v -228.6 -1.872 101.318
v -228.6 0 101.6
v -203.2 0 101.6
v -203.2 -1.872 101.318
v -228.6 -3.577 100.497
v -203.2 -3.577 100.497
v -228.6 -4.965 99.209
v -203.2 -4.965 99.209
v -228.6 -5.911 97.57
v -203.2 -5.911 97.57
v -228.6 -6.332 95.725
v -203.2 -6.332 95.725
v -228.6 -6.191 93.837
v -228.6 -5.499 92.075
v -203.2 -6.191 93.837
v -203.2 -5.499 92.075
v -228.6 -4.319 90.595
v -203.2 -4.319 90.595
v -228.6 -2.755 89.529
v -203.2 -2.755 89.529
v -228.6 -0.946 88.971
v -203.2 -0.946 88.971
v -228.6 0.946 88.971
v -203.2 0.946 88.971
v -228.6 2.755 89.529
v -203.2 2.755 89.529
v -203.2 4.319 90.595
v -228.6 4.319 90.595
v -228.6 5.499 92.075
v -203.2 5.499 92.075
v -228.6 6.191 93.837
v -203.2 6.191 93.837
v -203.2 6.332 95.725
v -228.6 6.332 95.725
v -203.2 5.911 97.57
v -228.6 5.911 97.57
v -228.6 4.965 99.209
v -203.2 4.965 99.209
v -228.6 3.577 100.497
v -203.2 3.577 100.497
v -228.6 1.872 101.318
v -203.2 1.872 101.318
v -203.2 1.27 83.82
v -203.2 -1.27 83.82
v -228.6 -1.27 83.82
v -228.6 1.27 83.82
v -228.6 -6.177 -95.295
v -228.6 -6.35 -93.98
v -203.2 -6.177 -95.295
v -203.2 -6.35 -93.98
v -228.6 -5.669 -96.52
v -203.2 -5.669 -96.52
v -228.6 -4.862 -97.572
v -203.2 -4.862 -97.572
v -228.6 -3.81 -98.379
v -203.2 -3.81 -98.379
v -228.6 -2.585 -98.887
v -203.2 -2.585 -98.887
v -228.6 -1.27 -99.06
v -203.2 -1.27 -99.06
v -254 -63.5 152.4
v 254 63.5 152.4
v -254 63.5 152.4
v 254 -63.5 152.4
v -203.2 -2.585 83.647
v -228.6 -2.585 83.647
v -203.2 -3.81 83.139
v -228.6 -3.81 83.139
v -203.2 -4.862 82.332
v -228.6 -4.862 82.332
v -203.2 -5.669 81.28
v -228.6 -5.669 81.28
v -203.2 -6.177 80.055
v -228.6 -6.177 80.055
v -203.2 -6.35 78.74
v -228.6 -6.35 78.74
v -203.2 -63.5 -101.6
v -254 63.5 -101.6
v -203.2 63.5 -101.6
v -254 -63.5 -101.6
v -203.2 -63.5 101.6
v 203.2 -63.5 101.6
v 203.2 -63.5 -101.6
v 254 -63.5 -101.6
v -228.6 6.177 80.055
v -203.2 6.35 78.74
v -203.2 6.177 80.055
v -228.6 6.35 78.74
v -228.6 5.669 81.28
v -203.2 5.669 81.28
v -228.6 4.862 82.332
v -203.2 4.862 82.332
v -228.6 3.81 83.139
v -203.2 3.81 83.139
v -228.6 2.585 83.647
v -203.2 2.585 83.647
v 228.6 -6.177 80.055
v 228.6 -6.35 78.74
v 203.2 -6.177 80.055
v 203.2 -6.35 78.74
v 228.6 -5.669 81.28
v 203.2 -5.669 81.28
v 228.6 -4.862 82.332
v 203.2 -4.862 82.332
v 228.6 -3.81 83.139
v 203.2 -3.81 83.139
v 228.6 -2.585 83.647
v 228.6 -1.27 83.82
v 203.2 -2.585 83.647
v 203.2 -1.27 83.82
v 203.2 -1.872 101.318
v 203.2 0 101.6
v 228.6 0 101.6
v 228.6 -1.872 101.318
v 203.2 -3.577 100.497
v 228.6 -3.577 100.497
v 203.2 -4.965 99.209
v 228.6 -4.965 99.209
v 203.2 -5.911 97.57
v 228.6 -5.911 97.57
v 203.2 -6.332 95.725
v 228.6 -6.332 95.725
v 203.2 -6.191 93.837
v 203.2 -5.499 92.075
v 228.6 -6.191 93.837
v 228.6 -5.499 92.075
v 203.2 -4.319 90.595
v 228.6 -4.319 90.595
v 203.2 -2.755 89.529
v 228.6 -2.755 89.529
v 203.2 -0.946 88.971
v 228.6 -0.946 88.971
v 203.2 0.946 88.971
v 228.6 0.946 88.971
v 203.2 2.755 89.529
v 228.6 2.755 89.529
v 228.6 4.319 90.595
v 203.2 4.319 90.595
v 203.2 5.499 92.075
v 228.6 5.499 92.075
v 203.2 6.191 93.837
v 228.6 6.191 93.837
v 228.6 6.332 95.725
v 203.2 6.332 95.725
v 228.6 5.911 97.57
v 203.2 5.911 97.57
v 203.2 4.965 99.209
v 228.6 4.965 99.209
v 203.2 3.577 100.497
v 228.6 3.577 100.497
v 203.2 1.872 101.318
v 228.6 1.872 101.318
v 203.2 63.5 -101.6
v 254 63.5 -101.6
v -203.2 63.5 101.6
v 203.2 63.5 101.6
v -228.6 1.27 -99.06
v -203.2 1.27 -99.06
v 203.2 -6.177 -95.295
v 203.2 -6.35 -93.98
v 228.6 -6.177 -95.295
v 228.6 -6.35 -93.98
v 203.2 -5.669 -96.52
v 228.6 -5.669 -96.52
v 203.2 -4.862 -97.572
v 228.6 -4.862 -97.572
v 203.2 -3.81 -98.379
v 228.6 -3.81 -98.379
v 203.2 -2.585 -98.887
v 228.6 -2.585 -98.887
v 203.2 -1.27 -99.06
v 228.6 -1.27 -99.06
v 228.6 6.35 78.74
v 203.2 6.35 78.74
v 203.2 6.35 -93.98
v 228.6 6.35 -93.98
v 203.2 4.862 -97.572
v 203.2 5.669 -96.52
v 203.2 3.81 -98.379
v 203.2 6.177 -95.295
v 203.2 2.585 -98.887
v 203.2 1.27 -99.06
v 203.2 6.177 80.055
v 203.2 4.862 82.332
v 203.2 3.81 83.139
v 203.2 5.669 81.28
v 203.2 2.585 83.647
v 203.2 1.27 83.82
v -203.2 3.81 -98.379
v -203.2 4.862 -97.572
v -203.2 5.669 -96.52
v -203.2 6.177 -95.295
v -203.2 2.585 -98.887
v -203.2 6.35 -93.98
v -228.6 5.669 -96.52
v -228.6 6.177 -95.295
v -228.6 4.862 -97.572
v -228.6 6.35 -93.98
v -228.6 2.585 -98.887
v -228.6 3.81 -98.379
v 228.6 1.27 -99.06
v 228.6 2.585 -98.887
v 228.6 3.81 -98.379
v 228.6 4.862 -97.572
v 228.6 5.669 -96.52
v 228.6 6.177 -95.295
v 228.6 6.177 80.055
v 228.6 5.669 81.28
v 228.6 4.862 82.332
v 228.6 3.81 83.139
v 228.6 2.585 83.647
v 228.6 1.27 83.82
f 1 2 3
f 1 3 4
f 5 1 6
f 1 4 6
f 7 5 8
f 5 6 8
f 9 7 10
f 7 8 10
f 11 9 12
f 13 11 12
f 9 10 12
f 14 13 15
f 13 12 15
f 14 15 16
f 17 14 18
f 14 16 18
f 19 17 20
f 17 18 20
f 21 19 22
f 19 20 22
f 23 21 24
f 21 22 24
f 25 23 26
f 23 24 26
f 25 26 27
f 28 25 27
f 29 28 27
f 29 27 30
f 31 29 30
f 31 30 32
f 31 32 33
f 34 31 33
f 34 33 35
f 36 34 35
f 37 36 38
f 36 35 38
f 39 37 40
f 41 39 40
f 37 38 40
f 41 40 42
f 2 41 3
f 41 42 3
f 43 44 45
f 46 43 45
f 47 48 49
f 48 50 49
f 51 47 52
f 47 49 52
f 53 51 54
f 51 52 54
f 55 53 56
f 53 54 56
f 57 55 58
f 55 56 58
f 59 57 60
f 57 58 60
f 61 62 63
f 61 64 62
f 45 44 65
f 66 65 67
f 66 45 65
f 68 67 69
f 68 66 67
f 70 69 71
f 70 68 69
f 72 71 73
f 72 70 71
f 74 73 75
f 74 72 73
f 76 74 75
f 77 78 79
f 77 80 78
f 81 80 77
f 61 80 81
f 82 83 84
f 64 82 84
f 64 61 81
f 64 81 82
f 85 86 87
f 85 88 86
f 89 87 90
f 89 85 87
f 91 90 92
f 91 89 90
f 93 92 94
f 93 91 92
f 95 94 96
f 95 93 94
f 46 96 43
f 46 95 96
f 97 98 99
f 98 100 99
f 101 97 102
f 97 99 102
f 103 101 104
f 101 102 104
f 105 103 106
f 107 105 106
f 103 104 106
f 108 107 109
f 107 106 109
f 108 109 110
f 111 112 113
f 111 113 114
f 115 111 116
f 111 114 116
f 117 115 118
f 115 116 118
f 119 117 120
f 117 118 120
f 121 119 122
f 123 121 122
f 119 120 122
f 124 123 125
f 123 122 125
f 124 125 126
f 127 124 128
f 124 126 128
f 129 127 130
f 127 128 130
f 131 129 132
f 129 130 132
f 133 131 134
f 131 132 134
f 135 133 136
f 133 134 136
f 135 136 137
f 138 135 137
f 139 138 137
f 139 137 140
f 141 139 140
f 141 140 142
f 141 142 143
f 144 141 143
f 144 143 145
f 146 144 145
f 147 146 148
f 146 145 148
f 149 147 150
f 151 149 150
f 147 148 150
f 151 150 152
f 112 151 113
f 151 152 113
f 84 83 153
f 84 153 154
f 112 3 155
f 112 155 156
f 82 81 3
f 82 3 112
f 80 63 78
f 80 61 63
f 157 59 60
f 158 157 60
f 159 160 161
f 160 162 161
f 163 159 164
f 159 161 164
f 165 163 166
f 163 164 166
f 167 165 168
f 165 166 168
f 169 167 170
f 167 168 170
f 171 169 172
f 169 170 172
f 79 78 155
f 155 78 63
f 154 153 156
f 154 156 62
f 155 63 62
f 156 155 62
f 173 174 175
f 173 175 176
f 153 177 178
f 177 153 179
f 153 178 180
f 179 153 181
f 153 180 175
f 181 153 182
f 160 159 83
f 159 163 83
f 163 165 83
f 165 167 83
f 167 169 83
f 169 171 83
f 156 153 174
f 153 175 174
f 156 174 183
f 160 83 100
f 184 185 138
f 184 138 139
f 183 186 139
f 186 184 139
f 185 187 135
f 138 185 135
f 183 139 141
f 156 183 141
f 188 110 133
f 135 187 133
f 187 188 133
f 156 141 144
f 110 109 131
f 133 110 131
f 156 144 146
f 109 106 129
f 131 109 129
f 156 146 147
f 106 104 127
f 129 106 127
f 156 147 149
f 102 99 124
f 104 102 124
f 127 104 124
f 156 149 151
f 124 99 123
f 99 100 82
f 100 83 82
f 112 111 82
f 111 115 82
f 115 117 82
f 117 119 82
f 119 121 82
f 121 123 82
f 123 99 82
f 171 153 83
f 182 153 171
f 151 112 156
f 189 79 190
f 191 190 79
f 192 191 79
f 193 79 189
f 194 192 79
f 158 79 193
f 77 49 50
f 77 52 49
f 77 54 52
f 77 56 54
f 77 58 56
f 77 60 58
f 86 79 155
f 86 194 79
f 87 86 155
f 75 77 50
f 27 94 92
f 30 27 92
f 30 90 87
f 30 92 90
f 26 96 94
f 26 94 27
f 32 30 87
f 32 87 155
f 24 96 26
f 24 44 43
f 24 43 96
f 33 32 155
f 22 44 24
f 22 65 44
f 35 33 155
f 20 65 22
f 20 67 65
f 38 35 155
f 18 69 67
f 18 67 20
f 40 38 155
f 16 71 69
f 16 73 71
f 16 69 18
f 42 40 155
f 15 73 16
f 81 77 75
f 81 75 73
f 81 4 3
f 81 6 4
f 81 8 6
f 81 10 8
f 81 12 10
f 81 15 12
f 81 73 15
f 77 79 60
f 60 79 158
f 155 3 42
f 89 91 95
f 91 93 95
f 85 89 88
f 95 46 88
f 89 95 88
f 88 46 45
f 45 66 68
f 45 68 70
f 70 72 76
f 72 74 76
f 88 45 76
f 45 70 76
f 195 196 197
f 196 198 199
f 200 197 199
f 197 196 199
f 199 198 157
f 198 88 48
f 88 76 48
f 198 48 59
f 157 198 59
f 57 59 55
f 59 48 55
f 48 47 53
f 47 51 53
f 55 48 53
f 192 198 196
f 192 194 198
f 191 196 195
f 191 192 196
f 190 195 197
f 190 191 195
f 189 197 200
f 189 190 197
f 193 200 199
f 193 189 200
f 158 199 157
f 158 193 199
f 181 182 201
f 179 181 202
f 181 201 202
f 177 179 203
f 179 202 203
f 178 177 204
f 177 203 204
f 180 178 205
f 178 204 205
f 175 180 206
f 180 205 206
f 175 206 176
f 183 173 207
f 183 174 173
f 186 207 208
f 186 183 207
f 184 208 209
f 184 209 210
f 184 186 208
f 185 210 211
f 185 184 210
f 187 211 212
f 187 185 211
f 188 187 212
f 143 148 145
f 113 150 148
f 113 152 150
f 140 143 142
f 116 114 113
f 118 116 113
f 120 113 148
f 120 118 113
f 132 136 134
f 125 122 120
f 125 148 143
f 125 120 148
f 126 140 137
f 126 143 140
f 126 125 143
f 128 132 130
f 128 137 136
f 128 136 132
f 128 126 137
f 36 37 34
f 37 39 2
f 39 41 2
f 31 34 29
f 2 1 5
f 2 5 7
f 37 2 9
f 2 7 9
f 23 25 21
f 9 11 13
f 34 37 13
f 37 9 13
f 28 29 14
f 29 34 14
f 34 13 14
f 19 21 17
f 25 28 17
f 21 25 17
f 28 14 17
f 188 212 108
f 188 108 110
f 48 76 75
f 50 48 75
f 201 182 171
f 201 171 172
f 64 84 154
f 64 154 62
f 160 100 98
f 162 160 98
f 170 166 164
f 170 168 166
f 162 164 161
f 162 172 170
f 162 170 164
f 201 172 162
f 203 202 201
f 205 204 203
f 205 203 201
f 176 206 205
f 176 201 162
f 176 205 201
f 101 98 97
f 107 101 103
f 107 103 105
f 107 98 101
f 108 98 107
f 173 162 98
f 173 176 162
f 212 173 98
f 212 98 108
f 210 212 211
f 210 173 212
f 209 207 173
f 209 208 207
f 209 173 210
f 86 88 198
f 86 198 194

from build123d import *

# Parameters (mm, degrees)
F0_W     = 50.8
F0_H     = 203.2
F1_DEPTH = 63.5
F2_W     = 25.4
F2_H     = 6.35
F5_DEPTH = 6.35
F6_R     = 5.08


with BuildPart() as f1:
    # F0 (on Front) → F1 (new body, symmetric)
    with BuildSketch(Plane.XZ):
        with Locations((-228.6, 0)):
            Rectangle(F0_W, F0_H)
        Polygon((-203.2, 101.6), (203.2, 101.6), (254, 101.6), (254, 152.4), (-254, 152.4), (-254, 101.6), align=None)
        with Locations((228.6, 0)):
            Rectangle(F0_W, F0_H)
    extrude(amount=F1_DEPTH, both=True)

    # F2 (on Front) → F3 (revolve, cut)
    with BuildSketch(Plane.XZ):
        with Locations((215.9, 98.425)):
            Rectangle(F2_W, F2_H)
        with Locations((-215.9, 98.425)):
            Rectangle(F2_W, F2_H)
    revolve(axis=Axis((-215.9, 0, 95.25), (1, 0, 0)), mode=Mode.SUBTRACT)

    # F4 (on Front) → F5 (cut, symmetric)
    with BuildSketch(Plane.XZ):
        Polygon((203.2, 83.82), (203.2, 0), (203.2, -99.06), (228.6, -99.06), (228.6, -92.71), (228.6, 83.82), align=None)
        Polygon((-203.2, -99.06), (-203.2, 0), (-203.2, 83.82), (-228.6, 83.82), (-228.6, -99.06), align=None)
    extrude(amount=F5_DEPTH, both=True, mode=Mode.SUBTRACT)

    # F6
    f6_edges = [f1.edges().sort_by_distance(p)[0] for p in [
        (-215.9, -6.35, 83.82),
        (-215.9, 6.35, 83.82),
        (-215.9, 6.35, -99.06),
        (-215.9, -6.35, -99.06),
        (215.9, -6.35, 83.82),
        (215.9, 6.35, 83.82),
        (215.9, -6.35, -99.06),
        (215.9, 6.35, -99.06),
    ]]
    fillet(f6_edges, radius=F6_R)


solid = f1.part
